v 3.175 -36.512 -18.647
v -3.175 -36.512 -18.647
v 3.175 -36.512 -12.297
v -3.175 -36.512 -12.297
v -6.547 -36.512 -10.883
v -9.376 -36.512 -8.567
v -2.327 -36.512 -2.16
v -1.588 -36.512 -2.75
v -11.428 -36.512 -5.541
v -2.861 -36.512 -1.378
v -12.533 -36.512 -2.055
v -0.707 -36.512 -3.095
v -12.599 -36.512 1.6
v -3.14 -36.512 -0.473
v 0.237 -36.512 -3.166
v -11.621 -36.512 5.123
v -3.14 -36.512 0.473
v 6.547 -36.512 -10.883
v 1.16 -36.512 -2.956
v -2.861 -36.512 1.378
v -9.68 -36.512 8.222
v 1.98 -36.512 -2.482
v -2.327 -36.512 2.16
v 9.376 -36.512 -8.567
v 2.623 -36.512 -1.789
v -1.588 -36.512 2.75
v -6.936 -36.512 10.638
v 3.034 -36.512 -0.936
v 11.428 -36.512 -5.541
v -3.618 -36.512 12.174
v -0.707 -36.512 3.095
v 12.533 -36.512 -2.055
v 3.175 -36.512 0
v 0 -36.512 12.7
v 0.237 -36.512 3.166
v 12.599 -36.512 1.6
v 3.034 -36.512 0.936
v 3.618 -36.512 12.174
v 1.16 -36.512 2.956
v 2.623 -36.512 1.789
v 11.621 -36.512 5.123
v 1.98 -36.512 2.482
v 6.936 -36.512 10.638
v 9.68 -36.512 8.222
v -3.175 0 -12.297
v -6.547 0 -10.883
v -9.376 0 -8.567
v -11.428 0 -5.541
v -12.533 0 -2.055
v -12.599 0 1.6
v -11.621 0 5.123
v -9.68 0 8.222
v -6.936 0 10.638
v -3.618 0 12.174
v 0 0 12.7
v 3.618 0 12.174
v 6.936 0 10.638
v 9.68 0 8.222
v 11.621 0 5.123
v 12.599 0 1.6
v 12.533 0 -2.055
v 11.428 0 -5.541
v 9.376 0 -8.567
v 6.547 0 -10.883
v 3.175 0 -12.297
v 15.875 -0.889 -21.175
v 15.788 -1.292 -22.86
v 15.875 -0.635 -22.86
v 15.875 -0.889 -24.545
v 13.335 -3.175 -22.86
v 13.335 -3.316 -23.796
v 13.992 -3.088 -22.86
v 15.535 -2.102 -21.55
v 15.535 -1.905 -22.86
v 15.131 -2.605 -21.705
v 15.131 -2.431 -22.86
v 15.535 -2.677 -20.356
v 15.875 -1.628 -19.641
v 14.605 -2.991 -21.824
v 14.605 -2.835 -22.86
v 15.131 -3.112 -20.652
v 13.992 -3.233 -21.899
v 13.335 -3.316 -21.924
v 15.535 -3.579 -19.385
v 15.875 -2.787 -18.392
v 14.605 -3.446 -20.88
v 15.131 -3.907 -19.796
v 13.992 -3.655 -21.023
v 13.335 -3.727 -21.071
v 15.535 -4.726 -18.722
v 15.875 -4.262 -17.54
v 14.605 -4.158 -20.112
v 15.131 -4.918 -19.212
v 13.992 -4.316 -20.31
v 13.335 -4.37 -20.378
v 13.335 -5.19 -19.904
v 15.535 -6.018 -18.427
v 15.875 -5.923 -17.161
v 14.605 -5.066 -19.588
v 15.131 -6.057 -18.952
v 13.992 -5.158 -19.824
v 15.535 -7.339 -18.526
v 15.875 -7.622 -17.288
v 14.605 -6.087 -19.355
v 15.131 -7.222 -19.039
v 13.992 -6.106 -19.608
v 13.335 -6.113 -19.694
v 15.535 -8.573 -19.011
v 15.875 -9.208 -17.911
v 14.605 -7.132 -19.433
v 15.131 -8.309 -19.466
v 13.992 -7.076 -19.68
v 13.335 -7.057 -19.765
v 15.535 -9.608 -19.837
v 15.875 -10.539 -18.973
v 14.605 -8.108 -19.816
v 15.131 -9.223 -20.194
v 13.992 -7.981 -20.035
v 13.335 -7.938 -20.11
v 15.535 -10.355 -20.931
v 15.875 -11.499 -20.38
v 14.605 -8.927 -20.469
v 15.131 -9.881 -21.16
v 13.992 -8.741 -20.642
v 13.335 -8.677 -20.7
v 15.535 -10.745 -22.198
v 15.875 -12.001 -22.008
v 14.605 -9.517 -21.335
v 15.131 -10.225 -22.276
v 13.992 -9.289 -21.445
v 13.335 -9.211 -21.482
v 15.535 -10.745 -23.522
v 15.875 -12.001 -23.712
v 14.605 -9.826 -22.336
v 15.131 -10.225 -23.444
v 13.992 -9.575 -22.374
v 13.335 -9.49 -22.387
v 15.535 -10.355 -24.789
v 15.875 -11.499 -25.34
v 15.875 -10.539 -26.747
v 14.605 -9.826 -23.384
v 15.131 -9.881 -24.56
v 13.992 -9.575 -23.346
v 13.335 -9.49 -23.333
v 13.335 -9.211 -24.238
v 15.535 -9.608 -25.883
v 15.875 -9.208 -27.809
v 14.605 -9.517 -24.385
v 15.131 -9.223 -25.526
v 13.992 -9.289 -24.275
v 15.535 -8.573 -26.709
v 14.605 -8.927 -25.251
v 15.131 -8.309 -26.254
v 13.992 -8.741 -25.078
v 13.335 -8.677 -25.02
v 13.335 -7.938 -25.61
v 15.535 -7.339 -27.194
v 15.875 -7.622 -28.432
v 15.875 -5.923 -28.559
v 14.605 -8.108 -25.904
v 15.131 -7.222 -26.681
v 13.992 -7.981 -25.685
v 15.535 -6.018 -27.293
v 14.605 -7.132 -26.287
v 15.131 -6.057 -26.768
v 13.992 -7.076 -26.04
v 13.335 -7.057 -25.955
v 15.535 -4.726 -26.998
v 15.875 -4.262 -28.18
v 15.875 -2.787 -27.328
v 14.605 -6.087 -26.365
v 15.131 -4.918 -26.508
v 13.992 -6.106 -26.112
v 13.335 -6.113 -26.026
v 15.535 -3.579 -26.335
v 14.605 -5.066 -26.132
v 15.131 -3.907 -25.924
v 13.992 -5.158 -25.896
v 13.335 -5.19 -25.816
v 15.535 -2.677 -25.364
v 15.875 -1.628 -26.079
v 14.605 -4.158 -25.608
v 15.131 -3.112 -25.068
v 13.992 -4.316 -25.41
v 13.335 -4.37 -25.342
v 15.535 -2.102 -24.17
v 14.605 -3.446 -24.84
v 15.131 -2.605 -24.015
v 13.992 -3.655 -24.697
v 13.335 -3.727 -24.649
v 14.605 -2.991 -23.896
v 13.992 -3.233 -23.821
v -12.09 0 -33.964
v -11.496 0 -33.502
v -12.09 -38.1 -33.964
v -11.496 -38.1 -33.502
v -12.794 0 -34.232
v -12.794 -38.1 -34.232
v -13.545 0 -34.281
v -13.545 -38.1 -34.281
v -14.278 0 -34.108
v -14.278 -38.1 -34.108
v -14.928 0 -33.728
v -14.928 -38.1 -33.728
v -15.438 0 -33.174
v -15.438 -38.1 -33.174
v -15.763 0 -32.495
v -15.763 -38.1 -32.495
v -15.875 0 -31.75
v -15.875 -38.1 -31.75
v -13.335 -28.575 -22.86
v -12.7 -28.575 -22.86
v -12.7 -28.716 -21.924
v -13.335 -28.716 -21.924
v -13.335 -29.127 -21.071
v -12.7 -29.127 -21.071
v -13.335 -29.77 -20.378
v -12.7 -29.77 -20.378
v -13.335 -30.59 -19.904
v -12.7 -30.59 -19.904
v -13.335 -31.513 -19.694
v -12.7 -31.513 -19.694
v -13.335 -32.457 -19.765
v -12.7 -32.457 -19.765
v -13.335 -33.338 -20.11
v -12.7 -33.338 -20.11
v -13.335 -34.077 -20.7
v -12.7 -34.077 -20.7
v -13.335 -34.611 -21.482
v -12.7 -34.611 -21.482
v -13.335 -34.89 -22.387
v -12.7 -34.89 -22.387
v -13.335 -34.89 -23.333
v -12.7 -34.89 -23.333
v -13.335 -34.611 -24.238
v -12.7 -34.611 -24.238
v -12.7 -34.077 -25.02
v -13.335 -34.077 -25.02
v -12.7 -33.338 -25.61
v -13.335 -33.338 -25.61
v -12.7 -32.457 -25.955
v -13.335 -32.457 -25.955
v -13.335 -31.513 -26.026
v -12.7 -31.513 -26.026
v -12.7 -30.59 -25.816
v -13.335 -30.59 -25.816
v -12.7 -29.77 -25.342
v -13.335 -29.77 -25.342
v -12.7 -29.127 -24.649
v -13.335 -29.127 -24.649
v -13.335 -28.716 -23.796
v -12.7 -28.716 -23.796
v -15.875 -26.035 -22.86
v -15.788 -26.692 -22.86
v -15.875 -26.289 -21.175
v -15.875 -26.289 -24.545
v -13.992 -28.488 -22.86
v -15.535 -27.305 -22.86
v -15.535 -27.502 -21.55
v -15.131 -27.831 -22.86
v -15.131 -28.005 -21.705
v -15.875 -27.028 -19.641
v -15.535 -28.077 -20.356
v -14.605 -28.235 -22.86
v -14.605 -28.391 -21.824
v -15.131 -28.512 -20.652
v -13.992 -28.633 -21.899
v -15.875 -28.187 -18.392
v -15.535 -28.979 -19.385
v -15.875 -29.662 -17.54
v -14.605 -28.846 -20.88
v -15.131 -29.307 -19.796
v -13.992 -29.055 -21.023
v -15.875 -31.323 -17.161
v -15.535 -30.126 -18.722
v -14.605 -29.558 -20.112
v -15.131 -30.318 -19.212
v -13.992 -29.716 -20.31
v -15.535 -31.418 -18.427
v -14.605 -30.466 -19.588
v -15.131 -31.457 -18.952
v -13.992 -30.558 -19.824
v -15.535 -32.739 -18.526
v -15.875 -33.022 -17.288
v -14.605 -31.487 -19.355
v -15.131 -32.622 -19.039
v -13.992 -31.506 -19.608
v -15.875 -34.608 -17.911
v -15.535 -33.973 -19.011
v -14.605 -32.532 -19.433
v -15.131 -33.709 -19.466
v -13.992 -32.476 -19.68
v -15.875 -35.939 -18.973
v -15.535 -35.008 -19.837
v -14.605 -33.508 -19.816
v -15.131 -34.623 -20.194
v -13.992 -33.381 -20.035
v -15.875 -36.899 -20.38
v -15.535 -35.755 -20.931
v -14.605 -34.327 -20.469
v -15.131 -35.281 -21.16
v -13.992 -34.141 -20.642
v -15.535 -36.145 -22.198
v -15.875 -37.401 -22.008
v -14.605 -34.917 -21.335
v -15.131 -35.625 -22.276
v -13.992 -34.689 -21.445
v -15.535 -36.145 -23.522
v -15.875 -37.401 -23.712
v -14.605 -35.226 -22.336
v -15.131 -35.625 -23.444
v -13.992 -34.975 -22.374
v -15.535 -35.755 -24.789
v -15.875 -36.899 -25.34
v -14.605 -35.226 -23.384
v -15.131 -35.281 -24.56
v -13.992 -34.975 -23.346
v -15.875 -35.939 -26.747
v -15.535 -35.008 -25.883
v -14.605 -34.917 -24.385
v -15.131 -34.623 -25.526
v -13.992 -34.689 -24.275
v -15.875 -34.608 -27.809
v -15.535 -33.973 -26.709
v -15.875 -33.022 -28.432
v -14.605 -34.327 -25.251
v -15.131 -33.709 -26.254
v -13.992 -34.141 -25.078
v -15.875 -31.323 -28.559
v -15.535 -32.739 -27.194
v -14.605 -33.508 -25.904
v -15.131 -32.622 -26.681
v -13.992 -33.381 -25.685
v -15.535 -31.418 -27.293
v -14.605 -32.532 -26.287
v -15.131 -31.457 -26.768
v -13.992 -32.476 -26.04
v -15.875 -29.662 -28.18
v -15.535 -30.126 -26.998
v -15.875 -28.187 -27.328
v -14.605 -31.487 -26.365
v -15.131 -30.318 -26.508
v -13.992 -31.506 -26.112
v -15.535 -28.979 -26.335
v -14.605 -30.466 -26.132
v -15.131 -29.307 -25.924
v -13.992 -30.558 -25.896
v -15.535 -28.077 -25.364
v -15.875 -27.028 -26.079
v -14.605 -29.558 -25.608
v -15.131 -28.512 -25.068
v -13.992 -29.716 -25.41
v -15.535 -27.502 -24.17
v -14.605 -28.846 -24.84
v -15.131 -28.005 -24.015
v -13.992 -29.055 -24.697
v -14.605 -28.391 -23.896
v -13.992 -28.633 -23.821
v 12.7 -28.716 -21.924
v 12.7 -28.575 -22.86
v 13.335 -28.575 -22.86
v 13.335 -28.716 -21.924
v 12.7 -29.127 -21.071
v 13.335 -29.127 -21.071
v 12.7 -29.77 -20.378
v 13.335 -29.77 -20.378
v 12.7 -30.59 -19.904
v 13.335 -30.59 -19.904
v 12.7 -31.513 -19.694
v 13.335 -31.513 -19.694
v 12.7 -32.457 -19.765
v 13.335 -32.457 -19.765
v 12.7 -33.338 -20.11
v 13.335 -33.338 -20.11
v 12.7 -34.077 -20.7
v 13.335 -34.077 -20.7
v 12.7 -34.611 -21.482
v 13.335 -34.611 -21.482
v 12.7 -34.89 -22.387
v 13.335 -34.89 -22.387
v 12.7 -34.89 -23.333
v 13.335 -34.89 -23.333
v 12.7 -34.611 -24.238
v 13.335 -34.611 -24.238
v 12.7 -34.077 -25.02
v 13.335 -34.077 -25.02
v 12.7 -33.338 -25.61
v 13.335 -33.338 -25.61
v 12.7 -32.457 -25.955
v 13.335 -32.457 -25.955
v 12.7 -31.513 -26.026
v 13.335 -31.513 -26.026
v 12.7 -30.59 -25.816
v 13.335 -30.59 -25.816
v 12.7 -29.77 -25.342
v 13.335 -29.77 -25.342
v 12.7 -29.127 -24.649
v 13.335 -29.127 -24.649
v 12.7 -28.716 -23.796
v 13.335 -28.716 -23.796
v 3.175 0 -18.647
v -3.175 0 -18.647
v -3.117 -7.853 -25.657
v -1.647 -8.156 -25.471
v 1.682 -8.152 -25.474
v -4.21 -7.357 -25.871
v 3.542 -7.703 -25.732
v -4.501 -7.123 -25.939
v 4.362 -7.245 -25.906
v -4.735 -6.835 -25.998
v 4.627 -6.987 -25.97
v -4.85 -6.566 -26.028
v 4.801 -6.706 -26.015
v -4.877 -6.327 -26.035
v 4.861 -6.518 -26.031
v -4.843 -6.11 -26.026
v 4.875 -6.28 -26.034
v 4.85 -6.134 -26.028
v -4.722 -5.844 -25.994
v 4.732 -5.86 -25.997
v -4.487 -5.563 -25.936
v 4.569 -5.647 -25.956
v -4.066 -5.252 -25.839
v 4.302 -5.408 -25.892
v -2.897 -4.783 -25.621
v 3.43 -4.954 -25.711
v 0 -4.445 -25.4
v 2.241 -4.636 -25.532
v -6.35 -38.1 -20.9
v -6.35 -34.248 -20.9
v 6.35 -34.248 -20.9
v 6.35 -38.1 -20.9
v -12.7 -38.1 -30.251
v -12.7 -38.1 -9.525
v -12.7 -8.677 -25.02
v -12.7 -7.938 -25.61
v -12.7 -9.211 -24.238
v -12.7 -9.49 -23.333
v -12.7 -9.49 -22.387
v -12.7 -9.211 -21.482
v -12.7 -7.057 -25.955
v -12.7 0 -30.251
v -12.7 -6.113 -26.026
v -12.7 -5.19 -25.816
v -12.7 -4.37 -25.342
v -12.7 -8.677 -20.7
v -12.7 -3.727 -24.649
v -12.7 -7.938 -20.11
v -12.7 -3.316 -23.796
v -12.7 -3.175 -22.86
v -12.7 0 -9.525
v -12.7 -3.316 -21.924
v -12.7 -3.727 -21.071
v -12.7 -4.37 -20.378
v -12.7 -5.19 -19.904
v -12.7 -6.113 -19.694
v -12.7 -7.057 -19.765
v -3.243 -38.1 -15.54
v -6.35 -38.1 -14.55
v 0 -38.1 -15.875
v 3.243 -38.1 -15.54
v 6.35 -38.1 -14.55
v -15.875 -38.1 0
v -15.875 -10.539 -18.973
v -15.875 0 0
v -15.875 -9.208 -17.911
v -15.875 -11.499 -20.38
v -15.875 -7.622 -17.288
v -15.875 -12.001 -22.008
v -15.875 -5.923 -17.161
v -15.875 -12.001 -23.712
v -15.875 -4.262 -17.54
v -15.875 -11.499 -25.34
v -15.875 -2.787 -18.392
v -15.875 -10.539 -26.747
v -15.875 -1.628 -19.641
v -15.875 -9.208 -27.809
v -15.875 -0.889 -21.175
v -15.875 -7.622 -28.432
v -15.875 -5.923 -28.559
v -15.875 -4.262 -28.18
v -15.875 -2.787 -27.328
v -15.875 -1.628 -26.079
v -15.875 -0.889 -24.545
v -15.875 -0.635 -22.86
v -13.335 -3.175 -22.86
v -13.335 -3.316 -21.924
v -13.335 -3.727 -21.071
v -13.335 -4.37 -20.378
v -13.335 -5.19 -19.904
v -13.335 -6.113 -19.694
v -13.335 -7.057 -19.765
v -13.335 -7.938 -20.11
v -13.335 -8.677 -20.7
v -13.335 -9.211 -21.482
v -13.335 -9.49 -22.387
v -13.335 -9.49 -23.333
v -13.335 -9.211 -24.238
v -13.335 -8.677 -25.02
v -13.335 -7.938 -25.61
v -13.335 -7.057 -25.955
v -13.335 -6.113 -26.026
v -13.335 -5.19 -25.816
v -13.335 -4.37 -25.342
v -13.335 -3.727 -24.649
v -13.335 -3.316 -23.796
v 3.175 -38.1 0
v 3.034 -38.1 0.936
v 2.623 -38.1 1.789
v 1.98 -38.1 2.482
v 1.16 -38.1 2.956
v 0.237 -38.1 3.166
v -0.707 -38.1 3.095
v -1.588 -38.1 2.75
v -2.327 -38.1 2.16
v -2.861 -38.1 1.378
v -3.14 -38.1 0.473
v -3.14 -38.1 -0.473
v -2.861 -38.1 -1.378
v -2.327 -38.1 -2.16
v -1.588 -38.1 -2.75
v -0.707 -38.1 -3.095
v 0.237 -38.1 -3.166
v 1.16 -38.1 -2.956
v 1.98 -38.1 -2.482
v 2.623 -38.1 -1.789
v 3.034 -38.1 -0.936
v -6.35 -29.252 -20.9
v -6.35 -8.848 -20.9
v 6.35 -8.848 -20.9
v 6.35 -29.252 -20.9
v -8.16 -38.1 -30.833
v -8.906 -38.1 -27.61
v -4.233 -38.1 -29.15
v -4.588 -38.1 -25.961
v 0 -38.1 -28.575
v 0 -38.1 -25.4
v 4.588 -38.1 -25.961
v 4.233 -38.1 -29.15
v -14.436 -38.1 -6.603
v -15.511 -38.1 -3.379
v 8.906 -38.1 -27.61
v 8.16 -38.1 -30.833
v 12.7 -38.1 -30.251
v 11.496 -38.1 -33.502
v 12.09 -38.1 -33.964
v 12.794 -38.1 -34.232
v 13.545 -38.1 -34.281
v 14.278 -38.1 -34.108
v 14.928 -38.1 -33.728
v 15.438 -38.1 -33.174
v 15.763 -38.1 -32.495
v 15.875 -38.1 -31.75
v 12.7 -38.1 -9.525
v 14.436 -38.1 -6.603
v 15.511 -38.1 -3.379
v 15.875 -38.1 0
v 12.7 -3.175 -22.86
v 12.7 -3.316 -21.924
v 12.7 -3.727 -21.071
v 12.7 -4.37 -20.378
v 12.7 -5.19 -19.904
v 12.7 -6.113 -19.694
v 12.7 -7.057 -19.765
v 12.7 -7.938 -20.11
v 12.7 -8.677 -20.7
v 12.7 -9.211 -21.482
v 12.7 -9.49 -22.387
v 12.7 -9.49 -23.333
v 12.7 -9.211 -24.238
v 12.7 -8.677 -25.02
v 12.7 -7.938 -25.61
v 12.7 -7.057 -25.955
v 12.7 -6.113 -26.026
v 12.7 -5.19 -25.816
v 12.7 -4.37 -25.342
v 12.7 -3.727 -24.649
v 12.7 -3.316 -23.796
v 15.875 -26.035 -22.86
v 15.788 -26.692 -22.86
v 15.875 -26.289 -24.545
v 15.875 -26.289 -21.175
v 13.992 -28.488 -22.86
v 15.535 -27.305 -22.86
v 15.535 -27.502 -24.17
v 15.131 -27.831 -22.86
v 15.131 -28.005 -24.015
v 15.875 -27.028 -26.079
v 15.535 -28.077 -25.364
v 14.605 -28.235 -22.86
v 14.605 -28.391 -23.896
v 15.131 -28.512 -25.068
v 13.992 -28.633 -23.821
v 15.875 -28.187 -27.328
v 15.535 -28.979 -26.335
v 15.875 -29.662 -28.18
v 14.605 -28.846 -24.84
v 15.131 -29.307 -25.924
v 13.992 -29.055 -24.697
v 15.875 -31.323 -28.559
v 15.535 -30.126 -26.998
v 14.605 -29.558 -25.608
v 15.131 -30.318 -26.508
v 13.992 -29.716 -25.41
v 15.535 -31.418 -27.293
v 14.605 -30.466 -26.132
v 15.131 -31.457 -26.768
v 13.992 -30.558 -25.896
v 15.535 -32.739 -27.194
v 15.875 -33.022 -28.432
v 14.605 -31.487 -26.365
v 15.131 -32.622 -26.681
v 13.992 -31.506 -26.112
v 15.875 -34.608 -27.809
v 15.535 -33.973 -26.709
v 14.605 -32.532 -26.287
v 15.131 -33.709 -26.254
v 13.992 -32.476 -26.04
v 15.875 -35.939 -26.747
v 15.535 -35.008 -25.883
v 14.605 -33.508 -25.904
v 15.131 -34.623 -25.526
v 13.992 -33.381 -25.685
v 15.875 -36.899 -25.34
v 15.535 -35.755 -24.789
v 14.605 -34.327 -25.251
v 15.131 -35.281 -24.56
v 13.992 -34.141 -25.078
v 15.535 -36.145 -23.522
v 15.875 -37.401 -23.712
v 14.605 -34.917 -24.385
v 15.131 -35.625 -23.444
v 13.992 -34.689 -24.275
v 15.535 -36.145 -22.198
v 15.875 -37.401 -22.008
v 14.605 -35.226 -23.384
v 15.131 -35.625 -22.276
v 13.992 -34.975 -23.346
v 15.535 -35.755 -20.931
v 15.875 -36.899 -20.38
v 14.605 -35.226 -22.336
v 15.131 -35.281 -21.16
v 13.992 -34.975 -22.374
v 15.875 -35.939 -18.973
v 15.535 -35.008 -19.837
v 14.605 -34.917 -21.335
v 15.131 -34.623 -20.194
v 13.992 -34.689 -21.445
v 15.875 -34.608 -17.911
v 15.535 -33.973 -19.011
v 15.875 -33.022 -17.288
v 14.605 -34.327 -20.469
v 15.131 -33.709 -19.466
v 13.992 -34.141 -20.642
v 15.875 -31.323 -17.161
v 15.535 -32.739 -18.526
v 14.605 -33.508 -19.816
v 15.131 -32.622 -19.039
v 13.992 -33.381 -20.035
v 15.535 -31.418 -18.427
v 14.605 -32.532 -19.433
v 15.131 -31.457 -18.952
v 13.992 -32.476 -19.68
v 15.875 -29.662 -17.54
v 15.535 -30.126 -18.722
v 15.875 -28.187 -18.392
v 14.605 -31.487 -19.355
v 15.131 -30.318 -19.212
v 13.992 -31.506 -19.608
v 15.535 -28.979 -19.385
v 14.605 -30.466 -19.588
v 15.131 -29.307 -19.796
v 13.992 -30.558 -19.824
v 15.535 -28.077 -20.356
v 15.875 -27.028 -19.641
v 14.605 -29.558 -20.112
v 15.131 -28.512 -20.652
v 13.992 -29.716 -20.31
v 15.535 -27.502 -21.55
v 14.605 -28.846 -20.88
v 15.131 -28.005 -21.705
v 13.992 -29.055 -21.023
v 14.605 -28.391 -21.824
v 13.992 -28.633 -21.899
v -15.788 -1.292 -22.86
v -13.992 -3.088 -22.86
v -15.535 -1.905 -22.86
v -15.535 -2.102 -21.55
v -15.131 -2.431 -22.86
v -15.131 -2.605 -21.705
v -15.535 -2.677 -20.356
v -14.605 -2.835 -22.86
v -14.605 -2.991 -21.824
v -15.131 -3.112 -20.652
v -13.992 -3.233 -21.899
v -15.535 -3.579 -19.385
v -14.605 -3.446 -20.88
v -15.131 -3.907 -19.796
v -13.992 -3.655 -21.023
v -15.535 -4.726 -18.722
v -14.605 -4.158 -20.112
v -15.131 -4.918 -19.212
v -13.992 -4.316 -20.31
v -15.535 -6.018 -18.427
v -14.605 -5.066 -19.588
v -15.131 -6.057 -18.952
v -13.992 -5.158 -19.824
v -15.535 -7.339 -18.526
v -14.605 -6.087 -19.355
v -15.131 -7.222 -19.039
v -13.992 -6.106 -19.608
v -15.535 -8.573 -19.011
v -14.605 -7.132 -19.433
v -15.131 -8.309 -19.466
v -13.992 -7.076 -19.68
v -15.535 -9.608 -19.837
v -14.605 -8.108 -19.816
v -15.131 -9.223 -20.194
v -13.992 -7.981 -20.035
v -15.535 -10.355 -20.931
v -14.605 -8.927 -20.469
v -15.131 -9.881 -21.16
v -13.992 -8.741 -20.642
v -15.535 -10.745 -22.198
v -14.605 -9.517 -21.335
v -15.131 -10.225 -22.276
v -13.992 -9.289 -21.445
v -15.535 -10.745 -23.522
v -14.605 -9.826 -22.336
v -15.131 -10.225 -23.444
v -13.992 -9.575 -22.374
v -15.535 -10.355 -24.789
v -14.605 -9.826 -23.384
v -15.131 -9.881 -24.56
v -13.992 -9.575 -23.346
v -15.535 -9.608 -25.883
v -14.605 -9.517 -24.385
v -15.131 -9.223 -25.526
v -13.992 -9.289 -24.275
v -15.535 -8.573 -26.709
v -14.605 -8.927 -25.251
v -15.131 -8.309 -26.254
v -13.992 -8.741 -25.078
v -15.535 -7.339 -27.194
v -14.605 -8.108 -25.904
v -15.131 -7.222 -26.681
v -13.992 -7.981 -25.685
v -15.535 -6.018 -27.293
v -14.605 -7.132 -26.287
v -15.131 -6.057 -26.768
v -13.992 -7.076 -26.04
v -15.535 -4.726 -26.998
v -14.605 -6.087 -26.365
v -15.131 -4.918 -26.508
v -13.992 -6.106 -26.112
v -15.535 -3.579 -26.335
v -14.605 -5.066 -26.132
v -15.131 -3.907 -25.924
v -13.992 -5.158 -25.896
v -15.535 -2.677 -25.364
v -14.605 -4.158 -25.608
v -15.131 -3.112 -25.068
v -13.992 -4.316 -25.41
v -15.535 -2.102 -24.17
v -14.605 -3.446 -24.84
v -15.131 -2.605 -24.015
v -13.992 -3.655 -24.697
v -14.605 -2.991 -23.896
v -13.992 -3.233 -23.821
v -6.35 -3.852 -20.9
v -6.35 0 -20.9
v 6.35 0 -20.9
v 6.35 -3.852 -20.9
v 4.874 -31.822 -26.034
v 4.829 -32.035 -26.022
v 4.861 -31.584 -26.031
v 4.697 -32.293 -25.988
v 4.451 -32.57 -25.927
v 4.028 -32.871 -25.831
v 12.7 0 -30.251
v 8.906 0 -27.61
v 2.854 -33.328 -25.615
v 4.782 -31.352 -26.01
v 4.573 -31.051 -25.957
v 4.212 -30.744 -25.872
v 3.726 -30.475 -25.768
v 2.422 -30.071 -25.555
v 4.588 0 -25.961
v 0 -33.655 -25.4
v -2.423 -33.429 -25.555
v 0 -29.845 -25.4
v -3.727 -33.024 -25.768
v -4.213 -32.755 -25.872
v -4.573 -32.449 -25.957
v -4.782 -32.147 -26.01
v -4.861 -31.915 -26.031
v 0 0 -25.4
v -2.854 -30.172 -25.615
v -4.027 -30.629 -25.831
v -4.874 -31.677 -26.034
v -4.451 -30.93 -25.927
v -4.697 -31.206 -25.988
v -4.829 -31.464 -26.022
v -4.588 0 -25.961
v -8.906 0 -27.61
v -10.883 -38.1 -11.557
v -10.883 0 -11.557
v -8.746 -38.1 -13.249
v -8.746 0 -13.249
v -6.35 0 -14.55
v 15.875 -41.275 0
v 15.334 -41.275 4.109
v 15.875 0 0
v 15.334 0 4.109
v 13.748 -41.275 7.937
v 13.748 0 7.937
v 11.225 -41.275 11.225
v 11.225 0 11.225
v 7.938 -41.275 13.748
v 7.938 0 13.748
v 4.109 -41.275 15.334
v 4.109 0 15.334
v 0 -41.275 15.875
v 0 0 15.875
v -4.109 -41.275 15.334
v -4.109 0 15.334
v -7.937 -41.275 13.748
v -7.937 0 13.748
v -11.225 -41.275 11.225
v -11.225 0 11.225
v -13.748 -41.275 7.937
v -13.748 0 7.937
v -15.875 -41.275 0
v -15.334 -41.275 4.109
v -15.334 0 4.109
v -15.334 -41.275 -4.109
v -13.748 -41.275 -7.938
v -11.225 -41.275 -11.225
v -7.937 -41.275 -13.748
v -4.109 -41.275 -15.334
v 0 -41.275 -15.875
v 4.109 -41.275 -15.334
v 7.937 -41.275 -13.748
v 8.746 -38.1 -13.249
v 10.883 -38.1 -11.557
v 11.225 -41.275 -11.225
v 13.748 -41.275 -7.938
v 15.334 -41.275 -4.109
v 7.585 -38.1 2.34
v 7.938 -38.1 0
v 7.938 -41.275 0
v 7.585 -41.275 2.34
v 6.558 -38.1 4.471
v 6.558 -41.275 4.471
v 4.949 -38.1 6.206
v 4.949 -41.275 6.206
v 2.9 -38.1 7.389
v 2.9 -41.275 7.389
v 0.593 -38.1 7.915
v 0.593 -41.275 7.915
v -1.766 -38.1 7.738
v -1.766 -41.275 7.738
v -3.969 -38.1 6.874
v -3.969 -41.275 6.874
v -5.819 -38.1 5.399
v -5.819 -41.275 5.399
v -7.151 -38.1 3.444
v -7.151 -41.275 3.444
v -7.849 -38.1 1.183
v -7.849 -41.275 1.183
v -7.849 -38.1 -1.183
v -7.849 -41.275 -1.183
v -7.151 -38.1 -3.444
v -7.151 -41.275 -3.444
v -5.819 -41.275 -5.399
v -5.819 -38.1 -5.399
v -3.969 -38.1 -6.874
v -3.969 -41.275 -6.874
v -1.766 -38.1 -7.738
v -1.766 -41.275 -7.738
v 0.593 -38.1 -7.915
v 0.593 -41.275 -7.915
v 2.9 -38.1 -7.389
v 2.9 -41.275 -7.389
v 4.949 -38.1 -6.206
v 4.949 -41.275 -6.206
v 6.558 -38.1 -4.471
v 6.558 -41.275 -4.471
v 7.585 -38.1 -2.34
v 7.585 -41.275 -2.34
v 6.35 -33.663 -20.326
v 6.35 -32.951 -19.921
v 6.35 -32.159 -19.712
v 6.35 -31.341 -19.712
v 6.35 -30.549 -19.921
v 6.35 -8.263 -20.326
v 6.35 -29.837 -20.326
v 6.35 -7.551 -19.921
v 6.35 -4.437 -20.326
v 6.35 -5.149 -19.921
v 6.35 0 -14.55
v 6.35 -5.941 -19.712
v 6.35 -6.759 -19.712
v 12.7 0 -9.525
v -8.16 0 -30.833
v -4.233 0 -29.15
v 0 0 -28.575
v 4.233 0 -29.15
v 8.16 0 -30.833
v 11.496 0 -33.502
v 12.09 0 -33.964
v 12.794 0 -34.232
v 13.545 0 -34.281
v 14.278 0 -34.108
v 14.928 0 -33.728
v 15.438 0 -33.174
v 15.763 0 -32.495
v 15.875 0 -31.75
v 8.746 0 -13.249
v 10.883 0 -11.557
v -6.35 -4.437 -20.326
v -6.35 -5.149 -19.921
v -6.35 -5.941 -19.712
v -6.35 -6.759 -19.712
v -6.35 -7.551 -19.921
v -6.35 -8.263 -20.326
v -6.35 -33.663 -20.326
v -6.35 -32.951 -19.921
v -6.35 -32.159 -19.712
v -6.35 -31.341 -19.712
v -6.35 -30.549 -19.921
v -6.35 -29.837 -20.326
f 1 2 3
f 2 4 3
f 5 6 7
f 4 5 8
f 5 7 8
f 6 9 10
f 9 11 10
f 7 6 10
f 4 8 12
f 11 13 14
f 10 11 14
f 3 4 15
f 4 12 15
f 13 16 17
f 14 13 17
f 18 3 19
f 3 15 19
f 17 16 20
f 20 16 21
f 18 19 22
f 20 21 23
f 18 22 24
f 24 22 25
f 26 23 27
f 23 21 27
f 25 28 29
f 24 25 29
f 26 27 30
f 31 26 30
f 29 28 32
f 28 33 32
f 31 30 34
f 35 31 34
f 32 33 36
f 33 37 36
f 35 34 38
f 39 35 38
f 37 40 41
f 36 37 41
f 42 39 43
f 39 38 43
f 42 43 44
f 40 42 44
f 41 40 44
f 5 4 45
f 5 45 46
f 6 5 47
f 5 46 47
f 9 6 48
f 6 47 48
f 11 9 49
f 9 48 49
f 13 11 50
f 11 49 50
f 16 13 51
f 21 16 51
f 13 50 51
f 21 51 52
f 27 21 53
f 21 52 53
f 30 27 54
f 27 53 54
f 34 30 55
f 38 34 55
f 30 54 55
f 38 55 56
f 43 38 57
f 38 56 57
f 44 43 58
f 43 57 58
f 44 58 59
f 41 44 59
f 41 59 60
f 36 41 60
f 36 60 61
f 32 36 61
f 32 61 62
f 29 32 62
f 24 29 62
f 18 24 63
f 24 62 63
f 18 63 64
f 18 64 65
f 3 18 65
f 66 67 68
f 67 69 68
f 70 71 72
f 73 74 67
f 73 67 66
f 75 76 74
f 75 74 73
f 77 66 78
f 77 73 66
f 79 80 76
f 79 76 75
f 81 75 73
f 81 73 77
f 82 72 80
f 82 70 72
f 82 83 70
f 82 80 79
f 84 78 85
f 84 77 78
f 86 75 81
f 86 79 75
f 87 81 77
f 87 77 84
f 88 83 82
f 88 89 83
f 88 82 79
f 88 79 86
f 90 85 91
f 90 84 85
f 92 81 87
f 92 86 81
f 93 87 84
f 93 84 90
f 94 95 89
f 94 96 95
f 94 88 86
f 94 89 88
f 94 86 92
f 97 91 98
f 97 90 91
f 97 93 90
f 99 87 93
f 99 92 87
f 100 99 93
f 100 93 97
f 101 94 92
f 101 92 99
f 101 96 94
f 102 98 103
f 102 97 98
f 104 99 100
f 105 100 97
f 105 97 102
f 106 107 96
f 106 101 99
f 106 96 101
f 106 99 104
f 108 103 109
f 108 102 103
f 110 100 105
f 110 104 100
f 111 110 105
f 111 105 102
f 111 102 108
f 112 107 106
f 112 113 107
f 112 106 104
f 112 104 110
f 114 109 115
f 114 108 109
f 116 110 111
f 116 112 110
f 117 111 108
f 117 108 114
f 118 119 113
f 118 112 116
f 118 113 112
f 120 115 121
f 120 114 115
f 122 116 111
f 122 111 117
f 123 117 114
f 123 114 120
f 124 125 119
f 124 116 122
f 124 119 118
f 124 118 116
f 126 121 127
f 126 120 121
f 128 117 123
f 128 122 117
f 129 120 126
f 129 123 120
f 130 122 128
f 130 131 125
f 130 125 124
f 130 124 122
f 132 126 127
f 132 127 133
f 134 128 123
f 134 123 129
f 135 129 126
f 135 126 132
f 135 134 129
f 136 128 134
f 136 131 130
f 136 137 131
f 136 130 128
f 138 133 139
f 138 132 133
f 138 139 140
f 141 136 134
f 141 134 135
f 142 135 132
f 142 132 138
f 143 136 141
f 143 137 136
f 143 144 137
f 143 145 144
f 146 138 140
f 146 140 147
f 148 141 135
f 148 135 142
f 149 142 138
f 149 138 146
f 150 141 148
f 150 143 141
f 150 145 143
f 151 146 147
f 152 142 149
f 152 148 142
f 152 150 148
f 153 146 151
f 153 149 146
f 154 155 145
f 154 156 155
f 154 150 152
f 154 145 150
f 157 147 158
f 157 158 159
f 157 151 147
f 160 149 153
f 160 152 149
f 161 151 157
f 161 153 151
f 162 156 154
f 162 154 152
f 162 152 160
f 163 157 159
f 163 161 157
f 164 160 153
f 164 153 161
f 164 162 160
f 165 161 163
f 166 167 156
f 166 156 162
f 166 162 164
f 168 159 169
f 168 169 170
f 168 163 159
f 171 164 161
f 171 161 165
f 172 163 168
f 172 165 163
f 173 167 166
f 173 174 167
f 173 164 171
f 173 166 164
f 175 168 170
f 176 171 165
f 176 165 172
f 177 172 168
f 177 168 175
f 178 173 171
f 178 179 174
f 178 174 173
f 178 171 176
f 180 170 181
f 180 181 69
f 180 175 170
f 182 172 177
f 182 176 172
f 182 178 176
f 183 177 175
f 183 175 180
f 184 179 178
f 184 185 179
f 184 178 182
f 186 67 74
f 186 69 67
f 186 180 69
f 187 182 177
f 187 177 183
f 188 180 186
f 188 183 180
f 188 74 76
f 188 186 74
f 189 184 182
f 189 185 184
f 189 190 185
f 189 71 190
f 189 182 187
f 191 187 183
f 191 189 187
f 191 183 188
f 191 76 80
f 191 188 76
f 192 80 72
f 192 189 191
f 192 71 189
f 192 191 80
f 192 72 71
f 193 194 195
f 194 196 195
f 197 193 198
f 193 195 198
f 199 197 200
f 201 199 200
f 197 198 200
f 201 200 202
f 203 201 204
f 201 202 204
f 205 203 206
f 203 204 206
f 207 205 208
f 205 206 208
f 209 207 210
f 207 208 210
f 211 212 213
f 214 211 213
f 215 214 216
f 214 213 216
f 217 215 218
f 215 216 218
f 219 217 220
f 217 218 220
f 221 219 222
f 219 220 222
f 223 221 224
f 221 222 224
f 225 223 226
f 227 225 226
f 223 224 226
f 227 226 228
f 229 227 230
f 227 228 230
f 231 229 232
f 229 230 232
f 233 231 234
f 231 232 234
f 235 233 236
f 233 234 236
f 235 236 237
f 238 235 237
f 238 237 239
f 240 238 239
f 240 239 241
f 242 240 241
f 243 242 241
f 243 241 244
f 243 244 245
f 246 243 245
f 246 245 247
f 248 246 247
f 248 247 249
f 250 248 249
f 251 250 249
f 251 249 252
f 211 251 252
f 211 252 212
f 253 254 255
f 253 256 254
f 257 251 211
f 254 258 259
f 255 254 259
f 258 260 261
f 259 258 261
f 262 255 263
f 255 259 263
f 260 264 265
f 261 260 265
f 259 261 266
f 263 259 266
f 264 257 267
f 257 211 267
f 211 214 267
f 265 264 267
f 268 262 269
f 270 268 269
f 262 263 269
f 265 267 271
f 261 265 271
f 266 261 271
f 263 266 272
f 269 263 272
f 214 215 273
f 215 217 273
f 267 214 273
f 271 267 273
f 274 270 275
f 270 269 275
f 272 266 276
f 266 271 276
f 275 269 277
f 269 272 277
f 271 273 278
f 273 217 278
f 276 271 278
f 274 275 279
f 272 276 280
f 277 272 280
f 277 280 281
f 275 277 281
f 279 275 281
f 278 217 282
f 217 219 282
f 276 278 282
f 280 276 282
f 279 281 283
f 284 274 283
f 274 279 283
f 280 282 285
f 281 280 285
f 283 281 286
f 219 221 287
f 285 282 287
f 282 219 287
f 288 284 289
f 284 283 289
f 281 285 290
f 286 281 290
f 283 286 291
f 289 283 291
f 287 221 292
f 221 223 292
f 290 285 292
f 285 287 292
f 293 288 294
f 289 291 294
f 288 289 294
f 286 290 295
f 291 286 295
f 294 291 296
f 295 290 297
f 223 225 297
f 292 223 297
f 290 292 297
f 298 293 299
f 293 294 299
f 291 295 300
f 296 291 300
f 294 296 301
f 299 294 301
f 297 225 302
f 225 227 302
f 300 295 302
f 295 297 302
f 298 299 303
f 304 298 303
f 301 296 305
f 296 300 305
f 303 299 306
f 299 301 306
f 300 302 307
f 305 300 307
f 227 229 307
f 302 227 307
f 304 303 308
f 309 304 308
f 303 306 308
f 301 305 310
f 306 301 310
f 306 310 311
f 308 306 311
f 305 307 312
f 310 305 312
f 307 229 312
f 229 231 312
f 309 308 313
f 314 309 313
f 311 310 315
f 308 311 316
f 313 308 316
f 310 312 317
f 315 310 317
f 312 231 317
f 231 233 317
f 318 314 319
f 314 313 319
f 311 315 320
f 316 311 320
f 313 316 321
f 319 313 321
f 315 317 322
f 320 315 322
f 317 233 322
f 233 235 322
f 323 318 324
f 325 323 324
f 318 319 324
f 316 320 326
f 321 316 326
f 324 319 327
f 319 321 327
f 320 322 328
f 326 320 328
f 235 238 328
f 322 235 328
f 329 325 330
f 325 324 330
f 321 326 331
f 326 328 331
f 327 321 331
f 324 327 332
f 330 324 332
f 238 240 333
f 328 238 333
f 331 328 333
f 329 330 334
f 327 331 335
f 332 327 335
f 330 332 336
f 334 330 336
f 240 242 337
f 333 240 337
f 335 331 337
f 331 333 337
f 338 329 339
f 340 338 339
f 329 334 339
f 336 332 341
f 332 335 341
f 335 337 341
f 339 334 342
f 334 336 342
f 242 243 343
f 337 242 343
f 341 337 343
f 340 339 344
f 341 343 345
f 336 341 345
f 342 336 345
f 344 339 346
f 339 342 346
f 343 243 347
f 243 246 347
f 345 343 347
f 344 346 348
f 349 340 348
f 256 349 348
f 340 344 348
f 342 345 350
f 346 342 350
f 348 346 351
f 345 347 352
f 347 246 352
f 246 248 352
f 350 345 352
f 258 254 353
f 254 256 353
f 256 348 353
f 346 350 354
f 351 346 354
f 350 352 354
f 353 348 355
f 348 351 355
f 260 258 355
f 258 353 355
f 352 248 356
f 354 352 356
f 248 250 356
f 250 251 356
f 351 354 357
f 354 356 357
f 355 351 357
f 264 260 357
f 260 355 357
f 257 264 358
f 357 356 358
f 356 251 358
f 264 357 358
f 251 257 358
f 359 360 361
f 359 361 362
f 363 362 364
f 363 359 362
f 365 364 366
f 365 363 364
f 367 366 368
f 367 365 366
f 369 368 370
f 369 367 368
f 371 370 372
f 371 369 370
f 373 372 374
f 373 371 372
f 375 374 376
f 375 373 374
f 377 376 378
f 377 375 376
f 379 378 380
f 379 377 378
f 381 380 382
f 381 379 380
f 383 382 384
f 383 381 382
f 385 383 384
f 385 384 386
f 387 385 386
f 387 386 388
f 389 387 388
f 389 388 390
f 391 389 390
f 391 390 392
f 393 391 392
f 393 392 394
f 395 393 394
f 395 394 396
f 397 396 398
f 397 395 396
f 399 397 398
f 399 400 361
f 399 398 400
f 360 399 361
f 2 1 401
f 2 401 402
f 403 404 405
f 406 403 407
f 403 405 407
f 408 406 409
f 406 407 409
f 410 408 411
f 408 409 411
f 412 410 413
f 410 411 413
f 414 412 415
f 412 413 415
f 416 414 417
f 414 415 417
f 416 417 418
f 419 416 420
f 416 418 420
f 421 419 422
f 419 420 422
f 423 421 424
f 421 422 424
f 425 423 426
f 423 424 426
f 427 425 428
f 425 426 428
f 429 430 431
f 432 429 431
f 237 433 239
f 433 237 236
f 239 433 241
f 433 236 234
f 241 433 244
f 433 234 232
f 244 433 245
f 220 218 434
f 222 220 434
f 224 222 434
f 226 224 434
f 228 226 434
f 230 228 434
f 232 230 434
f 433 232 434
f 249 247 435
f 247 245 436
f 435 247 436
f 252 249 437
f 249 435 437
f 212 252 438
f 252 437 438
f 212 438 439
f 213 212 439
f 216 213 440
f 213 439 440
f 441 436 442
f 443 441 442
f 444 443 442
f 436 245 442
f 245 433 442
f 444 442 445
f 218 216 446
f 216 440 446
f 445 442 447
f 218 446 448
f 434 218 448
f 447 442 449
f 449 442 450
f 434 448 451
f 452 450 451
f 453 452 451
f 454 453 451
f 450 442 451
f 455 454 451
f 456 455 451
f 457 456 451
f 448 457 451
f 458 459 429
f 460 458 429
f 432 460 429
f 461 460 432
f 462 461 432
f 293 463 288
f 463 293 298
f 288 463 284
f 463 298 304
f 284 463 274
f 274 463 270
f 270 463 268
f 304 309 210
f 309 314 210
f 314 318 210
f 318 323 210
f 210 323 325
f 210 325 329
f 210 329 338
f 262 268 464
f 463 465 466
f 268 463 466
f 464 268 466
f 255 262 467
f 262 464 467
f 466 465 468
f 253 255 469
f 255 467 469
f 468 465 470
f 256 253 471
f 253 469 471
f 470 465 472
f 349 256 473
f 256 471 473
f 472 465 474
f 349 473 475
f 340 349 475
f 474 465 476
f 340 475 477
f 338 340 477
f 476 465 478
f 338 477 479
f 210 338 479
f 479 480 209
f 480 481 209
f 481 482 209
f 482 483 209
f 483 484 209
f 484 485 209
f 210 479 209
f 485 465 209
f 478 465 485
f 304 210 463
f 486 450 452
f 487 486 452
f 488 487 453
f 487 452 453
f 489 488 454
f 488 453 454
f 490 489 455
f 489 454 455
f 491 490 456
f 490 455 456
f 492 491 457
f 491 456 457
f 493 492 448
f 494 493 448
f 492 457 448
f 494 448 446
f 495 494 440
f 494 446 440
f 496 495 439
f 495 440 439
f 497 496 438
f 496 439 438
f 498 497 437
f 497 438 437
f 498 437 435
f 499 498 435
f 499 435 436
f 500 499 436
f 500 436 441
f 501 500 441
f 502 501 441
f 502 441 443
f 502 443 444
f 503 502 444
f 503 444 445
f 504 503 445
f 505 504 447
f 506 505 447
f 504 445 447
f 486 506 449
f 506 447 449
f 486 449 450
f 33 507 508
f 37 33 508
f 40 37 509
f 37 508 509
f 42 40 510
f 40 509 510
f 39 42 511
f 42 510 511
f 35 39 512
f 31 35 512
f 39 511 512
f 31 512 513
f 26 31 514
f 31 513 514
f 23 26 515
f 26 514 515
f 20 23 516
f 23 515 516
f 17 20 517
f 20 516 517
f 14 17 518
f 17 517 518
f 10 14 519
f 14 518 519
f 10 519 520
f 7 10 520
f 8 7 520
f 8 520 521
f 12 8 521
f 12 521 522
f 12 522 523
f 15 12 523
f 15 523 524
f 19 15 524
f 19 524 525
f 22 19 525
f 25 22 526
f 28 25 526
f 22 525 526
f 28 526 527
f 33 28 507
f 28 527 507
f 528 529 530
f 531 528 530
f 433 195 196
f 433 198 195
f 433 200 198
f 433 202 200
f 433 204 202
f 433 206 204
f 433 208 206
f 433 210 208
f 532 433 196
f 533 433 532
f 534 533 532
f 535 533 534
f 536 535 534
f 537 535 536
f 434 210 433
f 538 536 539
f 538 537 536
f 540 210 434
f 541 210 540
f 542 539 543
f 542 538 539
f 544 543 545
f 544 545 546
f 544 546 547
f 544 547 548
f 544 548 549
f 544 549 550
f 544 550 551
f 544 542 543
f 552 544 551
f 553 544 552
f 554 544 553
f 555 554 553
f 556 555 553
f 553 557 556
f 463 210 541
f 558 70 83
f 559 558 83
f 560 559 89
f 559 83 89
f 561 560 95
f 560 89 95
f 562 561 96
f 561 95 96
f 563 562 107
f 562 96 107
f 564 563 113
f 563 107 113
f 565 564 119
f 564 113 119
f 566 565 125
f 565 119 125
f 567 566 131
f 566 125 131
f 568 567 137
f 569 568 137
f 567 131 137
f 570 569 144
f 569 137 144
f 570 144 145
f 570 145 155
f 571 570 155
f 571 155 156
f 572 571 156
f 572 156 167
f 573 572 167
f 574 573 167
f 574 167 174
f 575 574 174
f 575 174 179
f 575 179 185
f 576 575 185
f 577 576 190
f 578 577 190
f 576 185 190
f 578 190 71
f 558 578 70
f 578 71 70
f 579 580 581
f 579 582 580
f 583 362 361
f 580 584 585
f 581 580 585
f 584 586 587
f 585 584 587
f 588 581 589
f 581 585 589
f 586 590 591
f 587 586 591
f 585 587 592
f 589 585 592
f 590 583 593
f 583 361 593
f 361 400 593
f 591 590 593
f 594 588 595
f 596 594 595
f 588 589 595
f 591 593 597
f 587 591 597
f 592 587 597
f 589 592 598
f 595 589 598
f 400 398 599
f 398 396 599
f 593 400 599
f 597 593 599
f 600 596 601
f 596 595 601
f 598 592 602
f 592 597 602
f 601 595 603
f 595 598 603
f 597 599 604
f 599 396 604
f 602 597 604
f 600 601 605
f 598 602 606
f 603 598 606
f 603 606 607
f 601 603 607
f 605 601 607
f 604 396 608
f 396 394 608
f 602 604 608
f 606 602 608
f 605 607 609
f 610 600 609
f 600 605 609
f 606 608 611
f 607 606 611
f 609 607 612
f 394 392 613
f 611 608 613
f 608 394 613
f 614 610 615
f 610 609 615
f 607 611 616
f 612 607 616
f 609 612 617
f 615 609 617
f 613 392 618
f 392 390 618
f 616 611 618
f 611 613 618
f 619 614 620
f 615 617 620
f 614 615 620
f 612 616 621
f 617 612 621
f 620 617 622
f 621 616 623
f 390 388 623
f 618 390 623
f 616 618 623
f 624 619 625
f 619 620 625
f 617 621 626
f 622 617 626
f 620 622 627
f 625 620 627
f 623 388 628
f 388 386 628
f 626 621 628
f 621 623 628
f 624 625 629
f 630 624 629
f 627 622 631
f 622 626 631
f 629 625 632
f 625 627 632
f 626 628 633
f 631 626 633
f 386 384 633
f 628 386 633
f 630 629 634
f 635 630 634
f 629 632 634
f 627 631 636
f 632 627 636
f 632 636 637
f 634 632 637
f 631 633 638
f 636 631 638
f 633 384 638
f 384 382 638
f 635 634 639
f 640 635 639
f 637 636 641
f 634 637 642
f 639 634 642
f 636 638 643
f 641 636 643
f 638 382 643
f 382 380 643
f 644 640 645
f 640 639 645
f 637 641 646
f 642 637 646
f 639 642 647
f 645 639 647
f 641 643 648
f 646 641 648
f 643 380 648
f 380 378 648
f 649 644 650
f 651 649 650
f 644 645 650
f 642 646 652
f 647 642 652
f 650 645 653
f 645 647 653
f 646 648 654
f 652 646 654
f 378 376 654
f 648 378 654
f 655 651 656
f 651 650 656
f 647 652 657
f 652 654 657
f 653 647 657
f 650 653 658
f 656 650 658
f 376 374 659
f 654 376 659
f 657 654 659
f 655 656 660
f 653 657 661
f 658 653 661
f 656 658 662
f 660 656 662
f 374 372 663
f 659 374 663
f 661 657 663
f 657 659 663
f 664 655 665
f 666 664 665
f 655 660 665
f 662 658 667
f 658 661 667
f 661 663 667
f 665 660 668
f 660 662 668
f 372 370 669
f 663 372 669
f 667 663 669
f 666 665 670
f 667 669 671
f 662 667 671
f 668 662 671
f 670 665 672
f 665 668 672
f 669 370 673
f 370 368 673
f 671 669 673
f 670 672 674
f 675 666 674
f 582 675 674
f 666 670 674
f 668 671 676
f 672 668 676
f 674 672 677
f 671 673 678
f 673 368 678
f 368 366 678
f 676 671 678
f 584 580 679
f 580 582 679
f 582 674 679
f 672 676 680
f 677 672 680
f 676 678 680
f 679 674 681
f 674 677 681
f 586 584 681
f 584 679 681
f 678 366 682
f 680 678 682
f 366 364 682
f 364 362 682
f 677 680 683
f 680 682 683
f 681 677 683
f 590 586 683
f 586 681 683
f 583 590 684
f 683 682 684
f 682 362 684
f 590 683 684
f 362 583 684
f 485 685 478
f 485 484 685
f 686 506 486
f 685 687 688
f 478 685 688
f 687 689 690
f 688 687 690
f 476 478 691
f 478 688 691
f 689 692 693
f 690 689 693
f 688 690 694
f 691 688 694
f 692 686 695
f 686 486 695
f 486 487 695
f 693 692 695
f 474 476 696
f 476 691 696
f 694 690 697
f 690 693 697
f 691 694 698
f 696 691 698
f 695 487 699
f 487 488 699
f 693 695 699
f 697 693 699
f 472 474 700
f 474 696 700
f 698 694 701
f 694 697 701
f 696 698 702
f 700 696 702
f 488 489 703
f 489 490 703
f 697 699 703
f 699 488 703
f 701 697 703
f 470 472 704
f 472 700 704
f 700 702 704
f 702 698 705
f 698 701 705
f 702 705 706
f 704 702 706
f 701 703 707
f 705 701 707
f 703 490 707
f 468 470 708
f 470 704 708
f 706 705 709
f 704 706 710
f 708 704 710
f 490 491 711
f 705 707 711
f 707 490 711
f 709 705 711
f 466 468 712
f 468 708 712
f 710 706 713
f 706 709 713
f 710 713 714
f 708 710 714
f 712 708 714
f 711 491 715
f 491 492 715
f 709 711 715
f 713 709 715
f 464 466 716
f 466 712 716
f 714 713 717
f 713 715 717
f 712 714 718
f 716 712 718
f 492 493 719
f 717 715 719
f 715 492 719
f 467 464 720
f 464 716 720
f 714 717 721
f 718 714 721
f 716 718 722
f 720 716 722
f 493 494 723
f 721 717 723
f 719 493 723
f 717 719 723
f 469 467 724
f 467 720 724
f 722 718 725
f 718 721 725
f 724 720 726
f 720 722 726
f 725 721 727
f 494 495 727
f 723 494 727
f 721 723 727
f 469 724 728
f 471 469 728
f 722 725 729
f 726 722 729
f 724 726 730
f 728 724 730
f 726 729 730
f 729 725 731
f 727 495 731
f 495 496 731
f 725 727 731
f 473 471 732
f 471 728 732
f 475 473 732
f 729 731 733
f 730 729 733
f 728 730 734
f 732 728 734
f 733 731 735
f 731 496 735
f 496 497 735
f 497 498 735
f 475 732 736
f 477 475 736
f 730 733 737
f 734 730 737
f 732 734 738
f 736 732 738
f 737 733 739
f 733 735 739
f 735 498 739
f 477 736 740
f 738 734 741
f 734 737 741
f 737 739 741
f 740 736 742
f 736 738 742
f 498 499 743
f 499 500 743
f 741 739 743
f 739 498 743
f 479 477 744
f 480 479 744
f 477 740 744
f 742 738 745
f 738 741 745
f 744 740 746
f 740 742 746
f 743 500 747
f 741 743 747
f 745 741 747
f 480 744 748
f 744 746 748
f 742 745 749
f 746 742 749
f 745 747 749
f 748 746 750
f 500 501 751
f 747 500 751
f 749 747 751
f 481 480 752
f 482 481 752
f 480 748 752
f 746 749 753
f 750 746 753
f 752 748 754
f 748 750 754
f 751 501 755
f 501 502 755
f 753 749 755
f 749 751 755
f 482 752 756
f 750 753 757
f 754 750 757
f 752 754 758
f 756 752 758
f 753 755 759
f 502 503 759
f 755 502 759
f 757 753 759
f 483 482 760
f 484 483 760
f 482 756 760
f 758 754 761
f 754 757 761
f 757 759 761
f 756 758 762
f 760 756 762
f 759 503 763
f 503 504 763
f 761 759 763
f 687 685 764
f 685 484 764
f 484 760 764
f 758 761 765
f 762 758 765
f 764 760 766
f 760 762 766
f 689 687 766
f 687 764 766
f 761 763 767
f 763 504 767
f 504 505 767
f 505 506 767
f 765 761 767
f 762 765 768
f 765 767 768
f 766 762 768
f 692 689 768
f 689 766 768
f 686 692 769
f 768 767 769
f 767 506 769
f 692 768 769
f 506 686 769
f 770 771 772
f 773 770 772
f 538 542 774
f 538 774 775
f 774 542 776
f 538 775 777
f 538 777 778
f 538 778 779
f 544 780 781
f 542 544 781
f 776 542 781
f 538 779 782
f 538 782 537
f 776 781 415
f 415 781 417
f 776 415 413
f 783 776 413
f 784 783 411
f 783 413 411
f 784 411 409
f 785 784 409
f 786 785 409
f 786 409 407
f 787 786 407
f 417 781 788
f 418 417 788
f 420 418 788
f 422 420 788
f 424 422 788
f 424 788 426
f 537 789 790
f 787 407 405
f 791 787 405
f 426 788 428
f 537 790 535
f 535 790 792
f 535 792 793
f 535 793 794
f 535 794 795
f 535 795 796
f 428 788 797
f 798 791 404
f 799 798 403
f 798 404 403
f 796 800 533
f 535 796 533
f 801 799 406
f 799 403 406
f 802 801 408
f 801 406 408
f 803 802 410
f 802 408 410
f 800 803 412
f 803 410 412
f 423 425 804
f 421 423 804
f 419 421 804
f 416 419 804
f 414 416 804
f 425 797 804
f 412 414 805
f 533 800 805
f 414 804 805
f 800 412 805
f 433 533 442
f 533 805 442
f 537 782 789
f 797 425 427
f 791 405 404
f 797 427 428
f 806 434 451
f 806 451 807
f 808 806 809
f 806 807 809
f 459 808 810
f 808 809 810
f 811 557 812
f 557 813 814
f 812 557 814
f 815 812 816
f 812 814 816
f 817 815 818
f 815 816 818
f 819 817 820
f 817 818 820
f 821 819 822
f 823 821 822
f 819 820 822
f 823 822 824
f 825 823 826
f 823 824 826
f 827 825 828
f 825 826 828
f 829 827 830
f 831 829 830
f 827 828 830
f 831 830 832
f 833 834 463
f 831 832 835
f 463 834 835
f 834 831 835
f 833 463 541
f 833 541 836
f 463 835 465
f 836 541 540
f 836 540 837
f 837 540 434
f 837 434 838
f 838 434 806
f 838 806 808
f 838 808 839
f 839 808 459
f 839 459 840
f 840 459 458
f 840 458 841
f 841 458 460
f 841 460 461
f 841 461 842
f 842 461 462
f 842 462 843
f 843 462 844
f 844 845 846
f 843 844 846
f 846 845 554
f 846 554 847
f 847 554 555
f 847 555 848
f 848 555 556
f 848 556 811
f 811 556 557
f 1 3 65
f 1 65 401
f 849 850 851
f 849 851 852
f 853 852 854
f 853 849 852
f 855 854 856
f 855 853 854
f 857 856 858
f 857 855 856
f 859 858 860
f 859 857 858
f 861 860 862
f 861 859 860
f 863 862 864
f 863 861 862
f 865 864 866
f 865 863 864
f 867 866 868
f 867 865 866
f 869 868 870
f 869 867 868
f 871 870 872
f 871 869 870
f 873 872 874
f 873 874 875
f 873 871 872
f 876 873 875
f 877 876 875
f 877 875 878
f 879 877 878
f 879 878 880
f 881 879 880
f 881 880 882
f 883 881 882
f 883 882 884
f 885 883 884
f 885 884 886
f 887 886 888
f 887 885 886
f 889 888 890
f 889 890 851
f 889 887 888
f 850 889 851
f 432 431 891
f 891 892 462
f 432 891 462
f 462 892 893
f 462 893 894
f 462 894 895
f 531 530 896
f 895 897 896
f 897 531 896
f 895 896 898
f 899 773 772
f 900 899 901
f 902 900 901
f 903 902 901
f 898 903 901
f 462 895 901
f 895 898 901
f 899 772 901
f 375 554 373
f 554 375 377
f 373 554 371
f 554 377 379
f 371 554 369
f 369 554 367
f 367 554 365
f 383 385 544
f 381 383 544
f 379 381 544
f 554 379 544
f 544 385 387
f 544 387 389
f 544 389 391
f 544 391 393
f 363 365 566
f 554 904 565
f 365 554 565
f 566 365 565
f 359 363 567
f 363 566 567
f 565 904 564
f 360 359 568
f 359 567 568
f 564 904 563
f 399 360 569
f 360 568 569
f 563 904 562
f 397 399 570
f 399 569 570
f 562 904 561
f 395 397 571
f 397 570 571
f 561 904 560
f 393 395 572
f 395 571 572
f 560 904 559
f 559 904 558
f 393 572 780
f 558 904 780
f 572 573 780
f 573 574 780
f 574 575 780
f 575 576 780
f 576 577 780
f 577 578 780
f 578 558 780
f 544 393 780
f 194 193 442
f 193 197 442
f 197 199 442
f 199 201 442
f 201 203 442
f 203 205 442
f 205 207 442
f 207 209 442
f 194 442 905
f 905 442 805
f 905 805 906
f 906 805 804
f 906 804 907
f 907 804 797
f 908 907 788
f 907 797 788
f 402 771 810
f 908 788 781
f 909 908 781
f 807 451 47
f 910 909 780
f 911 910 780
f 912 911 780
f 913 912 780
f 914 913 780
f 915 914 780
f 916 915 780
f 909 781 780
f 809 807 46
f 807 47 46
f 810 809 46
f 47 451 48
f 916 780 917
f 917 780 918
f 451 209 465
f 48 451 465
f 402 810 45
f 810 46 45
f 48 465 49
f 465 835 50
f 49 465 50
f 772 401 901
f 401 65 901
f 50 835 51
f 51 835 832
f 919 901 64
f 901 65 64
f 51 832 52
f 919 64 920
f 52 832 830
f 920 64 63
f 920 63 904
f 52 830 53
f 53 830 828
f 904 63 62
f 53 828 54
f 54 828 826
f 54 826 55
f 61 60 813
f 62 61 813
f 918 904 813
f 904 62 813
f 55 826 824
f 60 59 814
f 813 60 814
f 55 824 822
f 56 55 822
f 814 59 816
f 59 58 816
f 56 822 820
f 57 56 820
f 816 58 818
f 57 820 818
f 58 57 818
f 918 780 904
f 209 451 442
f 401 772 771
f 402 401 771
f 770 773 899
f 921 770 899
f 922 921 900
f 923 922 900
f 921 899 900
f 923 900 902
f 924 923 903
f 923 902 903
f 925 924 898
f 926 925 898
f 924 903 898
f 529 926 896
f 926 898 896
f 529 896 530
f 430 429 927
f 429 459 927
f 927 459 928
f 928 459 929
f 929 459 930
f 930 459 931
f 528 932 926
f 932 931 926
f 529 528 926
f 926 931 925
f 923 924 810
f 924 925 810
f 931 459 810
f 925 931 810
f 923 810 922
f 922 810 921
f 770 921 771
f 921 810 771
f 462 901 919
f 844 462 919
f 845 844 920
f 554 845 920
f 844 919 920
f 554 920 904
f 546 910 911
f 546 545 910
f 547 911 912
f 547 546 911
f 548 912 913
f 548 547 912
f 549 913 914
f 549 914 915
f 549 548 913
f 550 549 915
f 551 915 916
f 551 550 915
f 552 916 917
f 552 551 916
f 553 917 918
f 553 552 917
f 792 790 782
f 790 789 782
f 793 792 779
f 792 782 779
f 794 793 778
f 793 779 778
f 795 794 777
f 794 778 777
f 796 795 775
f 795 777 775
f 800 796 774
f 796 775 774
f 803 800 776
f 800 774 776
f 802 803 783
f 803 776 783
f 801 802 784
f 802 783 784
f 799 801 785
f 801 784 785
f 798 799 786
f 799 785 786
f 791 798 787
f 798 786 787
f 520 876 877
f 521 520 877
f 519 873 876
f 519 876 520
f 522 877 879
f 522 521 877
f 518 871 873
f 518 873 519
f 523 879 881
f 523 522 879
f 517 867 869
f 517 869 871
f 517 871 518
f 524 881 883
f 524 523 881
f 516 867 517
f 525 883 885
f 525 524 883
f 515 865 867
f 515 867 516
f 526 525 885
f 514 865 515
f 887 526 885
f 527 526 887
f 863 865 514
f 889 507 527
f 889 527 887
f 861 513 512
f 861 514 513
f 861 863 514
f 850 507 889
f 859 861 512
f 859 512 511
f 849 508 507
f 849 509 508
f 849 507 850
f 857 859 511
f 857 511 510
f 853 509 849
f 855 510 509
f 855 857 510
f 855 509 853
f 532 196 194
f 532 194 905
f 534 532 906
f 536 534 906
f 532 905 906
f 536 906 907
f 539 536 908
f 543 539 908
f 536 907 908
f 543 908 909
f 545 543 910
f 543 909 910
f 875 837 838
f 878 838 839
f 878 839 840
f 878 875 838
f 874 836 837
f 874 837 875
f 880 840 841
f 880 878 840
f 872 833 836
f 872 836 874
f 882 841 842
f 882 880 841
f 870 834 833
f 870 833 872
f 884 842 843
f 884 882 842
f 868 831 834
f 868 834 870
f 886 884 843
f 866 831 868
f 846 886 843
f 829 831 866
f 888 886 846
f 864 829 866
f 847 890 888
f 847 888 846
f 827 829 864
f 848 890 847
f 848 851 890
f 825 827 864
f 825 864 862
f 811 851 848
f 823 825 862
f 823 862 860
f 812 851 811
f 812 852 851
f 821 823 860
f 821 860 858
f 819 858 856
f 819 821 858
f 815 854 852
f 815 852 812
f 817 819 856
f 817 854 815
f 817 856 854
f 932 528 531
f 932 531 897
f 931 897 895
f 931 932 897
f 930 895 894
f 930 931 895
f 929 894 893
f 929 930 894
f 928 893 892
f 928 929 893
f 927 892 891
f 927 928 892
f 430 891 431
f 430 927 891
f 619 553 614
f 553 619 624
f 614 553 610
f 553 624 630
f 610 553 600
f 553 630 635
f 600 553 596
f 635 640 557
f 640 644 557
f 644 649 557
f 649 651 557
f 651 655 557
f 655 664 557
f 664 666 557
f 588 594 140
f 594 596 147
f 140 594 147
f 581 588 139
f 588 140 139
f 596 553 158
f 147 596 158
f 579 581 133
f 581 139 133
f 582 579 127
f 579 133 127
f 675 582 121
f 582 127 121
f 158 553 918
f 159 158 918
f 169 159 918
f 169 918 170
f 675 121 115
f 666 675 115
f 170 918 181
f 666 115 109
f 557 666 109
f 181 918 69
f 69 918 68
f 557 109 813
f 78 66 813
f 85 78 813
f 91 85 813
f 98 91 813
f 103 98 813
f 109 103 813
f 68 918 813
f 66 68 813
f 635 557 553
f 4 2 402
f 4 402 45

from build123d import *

# Parameters (mm, degrees)
F1_DEPTH = 38.1
F2_R     = 3.175
F3_DEPTH = 25.4
F4_R     = 2.53999
F5_R     = 2.54
F6_R     = 3.175
F7_DEPTH = 1.5875
F8_R     = 15.875
F8_R_2   = 7.9375
F9_DEPTH = 3.175


# Not quite as in the source:
# - a fillet or chamfer is up to 0.001 mm smaller than in the source, because OpenCascade refuses the exact size
# - a feature names something its author has since deleted; it is built from what else it names


with BuildPart() as f1:
    # F0 (on Front) → F1 (new body)
    with BuildSketch(Plane.XZ):
        with BuildLine():
            ThreePointArc((-15.875, -44.45), (0, -28.575), (15.875, -44.45))
            Line((15.875, -44.45), (15.875, 0))
            ThreePointArc((15.875, 0), (15.0603473566, -5.0201157855), (12.7, -9.525))
            Line((12.7, -9.525), (12.7, -30.2509683429))
            ThreePointArc((12.7, -30.2509683429), (0, -25.4), (-12.7, -30.2509683429))
            Line((-12.7, -30.2509683429), (-12.7, -9.525))
            ThreePointArc((-12.7, -9.525), (-15.0603473566, -5.0201157855), (-15.875, 0))
            Line((-15.875, 0), (-15.875, -44.45))
        make_face()
        with BuildLine():
            ThreePointArc((12.7, -9.525), (15.0603473566, -5.0201157855), (15.875, 0))
            ThreePointArc((15.875, 0), (0, 15.875), (-15.875, 0))
            ThreePointArc((-15.875, 0), (-15.0603473566, -5.0201157855), (-12.7, -9.525))
            ThreePointArc((-12.7, -9.525), (-9.8507599619, -12.4490221774), (-6.35, -14.5496778315))
            Line((-6.35, -14.5496778315), (-6.35, -20.8996778315))
            Line((-6.35, -20.8996778315), (6.35, -20.8996778315))
            Line((6.35, -20.8996778315), (6.35, -14.5496778315))
            ThreePointArc((6.35, -14.5496778315), (9.8507599619, -12.4490221774), (12.7, -9.525))
        make_face()
        with BuildLine():
            Line((-3.175, -18.6467221242), (-3.175, -12.2967221242))
            ThreePointArc((-3.175, -12.2967221242), (0, 12.7), (3.175, -12.2967221242))
            Line((3.175, -12.2967221242), (3.175, -18.6467221242))
            Line((3.175, -18.6467221242), (-3.175, -18.6467221242))
        make_face(mode=Mode.SUBTRACT)
    extrude(amount=F1_DEPTH)

    # F2 (on Right) → F3 (cut, symmetric)
    with BuildSketch(Plane.YZ):
        with Locations((-31.75, -22.86)):
            Circle(F2_R)
        with Locations((-6.35, -22.86)):
            Circle(F2_R)
    extrude(amount=F3_DEPTH, both=True, mode=Mode.SUBTRACT)

    # F4 (radius 2.54 in the source; OpenCascade refuses exactly that, so slightly less here)
    f4_edges = [f1.edges().sort_by_distance(p)[0] for p in [
        (15.875, -19.05, -44.45),
        (-15.875, -19.05, -44.45),
    ]]
    fillet(f4_edges, radius=F4_R)

    # F5
    f5_edges = [f1.edges().sort_by_distance(p)[0] for p in [
        (-15.875, -9.525, -22.86),
        (-15.875, -34.925, -22.86),
        (15.875, -34.925, -22.86),
        (15.875, -9.525, -22.86),
    ]]
    fillet(f5_edges, radius=F5_R)

    # F6 (on face) → F7 (join)
    with BuildSketch(Plane.XZ.offset(38.1)):
        with BuildLine():
            ThreePointArc((6.35, -14.5496778315), (0, 15.875), (-6.35, -14.5496778315))
            Line((-6.35, -14.5496778315), (-6.35, -20.8996778315))
            Line((-6.35, -20.8996778315), (6.35, -20.8996778315))
            Line((6.35, -20.8996778315), (6.35, -14.5496778315))
        make_face()
        Circle(F6_R, mode=Mode.SUBTRACT)
    extrude(amount=-F7_DEPTH)

    # F8 (on face) → F9 (join)
    with BuildSketch(Plane.XZ.offset(38.1)):
        Circle(F8_R)
        Circle(F8_R_2, mode=Mode.SUBTRACT)
    extrude(amount=F9_DEPTH)


solid = f1.part
